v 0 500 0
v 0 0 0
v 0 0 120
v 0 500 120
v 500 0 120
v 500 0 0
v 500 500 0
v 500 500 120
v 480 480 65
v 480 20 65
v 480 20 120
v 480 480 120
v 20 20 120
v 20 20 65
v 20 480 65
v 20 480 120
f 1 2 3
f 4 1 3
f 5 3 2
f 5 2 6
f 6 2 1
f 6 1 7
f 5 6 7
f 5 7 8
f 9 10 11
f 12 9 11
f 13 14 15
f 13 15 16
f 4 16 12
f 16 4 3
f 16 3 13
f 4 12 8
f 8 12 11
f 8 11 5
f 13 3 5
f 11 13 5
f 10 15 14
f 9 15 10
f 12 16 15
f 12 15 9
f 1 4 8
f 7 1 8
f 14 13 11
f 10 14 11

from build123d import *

# Parameters (mm, degrees)
F0_W     = 500
F0_H     = 120
F1_DEPTH = 500
F2_T     = -20
F3_W     = 460
F3_H     = 460
F4_DEPTH = 45


with BuildPart() as f1:
    # F0 (on Front) → F1 (new body)
    with BuildSketch(Plane.XZ):
        with Locations((250, 60)):
            Rectangle(F0_W, F0_H)
    extrude(amount=-F1_DEPTH)

    # F2
    f2_openings = [f1.faces().sort_by_distance(p)[0] for p in [
        (250, 250, 120),
    ]]
    offset(amount=F2_T, openings=f2_openings)

    # F3 (on face) → F4 (join)
    with BuildSketch(Plane.XY.offset(20)):
        with Locations((250, 250)):
            Rectangle(F3_W, F3_H)
    extrude(amount=F4_DEPTH)


solid = f1.part
